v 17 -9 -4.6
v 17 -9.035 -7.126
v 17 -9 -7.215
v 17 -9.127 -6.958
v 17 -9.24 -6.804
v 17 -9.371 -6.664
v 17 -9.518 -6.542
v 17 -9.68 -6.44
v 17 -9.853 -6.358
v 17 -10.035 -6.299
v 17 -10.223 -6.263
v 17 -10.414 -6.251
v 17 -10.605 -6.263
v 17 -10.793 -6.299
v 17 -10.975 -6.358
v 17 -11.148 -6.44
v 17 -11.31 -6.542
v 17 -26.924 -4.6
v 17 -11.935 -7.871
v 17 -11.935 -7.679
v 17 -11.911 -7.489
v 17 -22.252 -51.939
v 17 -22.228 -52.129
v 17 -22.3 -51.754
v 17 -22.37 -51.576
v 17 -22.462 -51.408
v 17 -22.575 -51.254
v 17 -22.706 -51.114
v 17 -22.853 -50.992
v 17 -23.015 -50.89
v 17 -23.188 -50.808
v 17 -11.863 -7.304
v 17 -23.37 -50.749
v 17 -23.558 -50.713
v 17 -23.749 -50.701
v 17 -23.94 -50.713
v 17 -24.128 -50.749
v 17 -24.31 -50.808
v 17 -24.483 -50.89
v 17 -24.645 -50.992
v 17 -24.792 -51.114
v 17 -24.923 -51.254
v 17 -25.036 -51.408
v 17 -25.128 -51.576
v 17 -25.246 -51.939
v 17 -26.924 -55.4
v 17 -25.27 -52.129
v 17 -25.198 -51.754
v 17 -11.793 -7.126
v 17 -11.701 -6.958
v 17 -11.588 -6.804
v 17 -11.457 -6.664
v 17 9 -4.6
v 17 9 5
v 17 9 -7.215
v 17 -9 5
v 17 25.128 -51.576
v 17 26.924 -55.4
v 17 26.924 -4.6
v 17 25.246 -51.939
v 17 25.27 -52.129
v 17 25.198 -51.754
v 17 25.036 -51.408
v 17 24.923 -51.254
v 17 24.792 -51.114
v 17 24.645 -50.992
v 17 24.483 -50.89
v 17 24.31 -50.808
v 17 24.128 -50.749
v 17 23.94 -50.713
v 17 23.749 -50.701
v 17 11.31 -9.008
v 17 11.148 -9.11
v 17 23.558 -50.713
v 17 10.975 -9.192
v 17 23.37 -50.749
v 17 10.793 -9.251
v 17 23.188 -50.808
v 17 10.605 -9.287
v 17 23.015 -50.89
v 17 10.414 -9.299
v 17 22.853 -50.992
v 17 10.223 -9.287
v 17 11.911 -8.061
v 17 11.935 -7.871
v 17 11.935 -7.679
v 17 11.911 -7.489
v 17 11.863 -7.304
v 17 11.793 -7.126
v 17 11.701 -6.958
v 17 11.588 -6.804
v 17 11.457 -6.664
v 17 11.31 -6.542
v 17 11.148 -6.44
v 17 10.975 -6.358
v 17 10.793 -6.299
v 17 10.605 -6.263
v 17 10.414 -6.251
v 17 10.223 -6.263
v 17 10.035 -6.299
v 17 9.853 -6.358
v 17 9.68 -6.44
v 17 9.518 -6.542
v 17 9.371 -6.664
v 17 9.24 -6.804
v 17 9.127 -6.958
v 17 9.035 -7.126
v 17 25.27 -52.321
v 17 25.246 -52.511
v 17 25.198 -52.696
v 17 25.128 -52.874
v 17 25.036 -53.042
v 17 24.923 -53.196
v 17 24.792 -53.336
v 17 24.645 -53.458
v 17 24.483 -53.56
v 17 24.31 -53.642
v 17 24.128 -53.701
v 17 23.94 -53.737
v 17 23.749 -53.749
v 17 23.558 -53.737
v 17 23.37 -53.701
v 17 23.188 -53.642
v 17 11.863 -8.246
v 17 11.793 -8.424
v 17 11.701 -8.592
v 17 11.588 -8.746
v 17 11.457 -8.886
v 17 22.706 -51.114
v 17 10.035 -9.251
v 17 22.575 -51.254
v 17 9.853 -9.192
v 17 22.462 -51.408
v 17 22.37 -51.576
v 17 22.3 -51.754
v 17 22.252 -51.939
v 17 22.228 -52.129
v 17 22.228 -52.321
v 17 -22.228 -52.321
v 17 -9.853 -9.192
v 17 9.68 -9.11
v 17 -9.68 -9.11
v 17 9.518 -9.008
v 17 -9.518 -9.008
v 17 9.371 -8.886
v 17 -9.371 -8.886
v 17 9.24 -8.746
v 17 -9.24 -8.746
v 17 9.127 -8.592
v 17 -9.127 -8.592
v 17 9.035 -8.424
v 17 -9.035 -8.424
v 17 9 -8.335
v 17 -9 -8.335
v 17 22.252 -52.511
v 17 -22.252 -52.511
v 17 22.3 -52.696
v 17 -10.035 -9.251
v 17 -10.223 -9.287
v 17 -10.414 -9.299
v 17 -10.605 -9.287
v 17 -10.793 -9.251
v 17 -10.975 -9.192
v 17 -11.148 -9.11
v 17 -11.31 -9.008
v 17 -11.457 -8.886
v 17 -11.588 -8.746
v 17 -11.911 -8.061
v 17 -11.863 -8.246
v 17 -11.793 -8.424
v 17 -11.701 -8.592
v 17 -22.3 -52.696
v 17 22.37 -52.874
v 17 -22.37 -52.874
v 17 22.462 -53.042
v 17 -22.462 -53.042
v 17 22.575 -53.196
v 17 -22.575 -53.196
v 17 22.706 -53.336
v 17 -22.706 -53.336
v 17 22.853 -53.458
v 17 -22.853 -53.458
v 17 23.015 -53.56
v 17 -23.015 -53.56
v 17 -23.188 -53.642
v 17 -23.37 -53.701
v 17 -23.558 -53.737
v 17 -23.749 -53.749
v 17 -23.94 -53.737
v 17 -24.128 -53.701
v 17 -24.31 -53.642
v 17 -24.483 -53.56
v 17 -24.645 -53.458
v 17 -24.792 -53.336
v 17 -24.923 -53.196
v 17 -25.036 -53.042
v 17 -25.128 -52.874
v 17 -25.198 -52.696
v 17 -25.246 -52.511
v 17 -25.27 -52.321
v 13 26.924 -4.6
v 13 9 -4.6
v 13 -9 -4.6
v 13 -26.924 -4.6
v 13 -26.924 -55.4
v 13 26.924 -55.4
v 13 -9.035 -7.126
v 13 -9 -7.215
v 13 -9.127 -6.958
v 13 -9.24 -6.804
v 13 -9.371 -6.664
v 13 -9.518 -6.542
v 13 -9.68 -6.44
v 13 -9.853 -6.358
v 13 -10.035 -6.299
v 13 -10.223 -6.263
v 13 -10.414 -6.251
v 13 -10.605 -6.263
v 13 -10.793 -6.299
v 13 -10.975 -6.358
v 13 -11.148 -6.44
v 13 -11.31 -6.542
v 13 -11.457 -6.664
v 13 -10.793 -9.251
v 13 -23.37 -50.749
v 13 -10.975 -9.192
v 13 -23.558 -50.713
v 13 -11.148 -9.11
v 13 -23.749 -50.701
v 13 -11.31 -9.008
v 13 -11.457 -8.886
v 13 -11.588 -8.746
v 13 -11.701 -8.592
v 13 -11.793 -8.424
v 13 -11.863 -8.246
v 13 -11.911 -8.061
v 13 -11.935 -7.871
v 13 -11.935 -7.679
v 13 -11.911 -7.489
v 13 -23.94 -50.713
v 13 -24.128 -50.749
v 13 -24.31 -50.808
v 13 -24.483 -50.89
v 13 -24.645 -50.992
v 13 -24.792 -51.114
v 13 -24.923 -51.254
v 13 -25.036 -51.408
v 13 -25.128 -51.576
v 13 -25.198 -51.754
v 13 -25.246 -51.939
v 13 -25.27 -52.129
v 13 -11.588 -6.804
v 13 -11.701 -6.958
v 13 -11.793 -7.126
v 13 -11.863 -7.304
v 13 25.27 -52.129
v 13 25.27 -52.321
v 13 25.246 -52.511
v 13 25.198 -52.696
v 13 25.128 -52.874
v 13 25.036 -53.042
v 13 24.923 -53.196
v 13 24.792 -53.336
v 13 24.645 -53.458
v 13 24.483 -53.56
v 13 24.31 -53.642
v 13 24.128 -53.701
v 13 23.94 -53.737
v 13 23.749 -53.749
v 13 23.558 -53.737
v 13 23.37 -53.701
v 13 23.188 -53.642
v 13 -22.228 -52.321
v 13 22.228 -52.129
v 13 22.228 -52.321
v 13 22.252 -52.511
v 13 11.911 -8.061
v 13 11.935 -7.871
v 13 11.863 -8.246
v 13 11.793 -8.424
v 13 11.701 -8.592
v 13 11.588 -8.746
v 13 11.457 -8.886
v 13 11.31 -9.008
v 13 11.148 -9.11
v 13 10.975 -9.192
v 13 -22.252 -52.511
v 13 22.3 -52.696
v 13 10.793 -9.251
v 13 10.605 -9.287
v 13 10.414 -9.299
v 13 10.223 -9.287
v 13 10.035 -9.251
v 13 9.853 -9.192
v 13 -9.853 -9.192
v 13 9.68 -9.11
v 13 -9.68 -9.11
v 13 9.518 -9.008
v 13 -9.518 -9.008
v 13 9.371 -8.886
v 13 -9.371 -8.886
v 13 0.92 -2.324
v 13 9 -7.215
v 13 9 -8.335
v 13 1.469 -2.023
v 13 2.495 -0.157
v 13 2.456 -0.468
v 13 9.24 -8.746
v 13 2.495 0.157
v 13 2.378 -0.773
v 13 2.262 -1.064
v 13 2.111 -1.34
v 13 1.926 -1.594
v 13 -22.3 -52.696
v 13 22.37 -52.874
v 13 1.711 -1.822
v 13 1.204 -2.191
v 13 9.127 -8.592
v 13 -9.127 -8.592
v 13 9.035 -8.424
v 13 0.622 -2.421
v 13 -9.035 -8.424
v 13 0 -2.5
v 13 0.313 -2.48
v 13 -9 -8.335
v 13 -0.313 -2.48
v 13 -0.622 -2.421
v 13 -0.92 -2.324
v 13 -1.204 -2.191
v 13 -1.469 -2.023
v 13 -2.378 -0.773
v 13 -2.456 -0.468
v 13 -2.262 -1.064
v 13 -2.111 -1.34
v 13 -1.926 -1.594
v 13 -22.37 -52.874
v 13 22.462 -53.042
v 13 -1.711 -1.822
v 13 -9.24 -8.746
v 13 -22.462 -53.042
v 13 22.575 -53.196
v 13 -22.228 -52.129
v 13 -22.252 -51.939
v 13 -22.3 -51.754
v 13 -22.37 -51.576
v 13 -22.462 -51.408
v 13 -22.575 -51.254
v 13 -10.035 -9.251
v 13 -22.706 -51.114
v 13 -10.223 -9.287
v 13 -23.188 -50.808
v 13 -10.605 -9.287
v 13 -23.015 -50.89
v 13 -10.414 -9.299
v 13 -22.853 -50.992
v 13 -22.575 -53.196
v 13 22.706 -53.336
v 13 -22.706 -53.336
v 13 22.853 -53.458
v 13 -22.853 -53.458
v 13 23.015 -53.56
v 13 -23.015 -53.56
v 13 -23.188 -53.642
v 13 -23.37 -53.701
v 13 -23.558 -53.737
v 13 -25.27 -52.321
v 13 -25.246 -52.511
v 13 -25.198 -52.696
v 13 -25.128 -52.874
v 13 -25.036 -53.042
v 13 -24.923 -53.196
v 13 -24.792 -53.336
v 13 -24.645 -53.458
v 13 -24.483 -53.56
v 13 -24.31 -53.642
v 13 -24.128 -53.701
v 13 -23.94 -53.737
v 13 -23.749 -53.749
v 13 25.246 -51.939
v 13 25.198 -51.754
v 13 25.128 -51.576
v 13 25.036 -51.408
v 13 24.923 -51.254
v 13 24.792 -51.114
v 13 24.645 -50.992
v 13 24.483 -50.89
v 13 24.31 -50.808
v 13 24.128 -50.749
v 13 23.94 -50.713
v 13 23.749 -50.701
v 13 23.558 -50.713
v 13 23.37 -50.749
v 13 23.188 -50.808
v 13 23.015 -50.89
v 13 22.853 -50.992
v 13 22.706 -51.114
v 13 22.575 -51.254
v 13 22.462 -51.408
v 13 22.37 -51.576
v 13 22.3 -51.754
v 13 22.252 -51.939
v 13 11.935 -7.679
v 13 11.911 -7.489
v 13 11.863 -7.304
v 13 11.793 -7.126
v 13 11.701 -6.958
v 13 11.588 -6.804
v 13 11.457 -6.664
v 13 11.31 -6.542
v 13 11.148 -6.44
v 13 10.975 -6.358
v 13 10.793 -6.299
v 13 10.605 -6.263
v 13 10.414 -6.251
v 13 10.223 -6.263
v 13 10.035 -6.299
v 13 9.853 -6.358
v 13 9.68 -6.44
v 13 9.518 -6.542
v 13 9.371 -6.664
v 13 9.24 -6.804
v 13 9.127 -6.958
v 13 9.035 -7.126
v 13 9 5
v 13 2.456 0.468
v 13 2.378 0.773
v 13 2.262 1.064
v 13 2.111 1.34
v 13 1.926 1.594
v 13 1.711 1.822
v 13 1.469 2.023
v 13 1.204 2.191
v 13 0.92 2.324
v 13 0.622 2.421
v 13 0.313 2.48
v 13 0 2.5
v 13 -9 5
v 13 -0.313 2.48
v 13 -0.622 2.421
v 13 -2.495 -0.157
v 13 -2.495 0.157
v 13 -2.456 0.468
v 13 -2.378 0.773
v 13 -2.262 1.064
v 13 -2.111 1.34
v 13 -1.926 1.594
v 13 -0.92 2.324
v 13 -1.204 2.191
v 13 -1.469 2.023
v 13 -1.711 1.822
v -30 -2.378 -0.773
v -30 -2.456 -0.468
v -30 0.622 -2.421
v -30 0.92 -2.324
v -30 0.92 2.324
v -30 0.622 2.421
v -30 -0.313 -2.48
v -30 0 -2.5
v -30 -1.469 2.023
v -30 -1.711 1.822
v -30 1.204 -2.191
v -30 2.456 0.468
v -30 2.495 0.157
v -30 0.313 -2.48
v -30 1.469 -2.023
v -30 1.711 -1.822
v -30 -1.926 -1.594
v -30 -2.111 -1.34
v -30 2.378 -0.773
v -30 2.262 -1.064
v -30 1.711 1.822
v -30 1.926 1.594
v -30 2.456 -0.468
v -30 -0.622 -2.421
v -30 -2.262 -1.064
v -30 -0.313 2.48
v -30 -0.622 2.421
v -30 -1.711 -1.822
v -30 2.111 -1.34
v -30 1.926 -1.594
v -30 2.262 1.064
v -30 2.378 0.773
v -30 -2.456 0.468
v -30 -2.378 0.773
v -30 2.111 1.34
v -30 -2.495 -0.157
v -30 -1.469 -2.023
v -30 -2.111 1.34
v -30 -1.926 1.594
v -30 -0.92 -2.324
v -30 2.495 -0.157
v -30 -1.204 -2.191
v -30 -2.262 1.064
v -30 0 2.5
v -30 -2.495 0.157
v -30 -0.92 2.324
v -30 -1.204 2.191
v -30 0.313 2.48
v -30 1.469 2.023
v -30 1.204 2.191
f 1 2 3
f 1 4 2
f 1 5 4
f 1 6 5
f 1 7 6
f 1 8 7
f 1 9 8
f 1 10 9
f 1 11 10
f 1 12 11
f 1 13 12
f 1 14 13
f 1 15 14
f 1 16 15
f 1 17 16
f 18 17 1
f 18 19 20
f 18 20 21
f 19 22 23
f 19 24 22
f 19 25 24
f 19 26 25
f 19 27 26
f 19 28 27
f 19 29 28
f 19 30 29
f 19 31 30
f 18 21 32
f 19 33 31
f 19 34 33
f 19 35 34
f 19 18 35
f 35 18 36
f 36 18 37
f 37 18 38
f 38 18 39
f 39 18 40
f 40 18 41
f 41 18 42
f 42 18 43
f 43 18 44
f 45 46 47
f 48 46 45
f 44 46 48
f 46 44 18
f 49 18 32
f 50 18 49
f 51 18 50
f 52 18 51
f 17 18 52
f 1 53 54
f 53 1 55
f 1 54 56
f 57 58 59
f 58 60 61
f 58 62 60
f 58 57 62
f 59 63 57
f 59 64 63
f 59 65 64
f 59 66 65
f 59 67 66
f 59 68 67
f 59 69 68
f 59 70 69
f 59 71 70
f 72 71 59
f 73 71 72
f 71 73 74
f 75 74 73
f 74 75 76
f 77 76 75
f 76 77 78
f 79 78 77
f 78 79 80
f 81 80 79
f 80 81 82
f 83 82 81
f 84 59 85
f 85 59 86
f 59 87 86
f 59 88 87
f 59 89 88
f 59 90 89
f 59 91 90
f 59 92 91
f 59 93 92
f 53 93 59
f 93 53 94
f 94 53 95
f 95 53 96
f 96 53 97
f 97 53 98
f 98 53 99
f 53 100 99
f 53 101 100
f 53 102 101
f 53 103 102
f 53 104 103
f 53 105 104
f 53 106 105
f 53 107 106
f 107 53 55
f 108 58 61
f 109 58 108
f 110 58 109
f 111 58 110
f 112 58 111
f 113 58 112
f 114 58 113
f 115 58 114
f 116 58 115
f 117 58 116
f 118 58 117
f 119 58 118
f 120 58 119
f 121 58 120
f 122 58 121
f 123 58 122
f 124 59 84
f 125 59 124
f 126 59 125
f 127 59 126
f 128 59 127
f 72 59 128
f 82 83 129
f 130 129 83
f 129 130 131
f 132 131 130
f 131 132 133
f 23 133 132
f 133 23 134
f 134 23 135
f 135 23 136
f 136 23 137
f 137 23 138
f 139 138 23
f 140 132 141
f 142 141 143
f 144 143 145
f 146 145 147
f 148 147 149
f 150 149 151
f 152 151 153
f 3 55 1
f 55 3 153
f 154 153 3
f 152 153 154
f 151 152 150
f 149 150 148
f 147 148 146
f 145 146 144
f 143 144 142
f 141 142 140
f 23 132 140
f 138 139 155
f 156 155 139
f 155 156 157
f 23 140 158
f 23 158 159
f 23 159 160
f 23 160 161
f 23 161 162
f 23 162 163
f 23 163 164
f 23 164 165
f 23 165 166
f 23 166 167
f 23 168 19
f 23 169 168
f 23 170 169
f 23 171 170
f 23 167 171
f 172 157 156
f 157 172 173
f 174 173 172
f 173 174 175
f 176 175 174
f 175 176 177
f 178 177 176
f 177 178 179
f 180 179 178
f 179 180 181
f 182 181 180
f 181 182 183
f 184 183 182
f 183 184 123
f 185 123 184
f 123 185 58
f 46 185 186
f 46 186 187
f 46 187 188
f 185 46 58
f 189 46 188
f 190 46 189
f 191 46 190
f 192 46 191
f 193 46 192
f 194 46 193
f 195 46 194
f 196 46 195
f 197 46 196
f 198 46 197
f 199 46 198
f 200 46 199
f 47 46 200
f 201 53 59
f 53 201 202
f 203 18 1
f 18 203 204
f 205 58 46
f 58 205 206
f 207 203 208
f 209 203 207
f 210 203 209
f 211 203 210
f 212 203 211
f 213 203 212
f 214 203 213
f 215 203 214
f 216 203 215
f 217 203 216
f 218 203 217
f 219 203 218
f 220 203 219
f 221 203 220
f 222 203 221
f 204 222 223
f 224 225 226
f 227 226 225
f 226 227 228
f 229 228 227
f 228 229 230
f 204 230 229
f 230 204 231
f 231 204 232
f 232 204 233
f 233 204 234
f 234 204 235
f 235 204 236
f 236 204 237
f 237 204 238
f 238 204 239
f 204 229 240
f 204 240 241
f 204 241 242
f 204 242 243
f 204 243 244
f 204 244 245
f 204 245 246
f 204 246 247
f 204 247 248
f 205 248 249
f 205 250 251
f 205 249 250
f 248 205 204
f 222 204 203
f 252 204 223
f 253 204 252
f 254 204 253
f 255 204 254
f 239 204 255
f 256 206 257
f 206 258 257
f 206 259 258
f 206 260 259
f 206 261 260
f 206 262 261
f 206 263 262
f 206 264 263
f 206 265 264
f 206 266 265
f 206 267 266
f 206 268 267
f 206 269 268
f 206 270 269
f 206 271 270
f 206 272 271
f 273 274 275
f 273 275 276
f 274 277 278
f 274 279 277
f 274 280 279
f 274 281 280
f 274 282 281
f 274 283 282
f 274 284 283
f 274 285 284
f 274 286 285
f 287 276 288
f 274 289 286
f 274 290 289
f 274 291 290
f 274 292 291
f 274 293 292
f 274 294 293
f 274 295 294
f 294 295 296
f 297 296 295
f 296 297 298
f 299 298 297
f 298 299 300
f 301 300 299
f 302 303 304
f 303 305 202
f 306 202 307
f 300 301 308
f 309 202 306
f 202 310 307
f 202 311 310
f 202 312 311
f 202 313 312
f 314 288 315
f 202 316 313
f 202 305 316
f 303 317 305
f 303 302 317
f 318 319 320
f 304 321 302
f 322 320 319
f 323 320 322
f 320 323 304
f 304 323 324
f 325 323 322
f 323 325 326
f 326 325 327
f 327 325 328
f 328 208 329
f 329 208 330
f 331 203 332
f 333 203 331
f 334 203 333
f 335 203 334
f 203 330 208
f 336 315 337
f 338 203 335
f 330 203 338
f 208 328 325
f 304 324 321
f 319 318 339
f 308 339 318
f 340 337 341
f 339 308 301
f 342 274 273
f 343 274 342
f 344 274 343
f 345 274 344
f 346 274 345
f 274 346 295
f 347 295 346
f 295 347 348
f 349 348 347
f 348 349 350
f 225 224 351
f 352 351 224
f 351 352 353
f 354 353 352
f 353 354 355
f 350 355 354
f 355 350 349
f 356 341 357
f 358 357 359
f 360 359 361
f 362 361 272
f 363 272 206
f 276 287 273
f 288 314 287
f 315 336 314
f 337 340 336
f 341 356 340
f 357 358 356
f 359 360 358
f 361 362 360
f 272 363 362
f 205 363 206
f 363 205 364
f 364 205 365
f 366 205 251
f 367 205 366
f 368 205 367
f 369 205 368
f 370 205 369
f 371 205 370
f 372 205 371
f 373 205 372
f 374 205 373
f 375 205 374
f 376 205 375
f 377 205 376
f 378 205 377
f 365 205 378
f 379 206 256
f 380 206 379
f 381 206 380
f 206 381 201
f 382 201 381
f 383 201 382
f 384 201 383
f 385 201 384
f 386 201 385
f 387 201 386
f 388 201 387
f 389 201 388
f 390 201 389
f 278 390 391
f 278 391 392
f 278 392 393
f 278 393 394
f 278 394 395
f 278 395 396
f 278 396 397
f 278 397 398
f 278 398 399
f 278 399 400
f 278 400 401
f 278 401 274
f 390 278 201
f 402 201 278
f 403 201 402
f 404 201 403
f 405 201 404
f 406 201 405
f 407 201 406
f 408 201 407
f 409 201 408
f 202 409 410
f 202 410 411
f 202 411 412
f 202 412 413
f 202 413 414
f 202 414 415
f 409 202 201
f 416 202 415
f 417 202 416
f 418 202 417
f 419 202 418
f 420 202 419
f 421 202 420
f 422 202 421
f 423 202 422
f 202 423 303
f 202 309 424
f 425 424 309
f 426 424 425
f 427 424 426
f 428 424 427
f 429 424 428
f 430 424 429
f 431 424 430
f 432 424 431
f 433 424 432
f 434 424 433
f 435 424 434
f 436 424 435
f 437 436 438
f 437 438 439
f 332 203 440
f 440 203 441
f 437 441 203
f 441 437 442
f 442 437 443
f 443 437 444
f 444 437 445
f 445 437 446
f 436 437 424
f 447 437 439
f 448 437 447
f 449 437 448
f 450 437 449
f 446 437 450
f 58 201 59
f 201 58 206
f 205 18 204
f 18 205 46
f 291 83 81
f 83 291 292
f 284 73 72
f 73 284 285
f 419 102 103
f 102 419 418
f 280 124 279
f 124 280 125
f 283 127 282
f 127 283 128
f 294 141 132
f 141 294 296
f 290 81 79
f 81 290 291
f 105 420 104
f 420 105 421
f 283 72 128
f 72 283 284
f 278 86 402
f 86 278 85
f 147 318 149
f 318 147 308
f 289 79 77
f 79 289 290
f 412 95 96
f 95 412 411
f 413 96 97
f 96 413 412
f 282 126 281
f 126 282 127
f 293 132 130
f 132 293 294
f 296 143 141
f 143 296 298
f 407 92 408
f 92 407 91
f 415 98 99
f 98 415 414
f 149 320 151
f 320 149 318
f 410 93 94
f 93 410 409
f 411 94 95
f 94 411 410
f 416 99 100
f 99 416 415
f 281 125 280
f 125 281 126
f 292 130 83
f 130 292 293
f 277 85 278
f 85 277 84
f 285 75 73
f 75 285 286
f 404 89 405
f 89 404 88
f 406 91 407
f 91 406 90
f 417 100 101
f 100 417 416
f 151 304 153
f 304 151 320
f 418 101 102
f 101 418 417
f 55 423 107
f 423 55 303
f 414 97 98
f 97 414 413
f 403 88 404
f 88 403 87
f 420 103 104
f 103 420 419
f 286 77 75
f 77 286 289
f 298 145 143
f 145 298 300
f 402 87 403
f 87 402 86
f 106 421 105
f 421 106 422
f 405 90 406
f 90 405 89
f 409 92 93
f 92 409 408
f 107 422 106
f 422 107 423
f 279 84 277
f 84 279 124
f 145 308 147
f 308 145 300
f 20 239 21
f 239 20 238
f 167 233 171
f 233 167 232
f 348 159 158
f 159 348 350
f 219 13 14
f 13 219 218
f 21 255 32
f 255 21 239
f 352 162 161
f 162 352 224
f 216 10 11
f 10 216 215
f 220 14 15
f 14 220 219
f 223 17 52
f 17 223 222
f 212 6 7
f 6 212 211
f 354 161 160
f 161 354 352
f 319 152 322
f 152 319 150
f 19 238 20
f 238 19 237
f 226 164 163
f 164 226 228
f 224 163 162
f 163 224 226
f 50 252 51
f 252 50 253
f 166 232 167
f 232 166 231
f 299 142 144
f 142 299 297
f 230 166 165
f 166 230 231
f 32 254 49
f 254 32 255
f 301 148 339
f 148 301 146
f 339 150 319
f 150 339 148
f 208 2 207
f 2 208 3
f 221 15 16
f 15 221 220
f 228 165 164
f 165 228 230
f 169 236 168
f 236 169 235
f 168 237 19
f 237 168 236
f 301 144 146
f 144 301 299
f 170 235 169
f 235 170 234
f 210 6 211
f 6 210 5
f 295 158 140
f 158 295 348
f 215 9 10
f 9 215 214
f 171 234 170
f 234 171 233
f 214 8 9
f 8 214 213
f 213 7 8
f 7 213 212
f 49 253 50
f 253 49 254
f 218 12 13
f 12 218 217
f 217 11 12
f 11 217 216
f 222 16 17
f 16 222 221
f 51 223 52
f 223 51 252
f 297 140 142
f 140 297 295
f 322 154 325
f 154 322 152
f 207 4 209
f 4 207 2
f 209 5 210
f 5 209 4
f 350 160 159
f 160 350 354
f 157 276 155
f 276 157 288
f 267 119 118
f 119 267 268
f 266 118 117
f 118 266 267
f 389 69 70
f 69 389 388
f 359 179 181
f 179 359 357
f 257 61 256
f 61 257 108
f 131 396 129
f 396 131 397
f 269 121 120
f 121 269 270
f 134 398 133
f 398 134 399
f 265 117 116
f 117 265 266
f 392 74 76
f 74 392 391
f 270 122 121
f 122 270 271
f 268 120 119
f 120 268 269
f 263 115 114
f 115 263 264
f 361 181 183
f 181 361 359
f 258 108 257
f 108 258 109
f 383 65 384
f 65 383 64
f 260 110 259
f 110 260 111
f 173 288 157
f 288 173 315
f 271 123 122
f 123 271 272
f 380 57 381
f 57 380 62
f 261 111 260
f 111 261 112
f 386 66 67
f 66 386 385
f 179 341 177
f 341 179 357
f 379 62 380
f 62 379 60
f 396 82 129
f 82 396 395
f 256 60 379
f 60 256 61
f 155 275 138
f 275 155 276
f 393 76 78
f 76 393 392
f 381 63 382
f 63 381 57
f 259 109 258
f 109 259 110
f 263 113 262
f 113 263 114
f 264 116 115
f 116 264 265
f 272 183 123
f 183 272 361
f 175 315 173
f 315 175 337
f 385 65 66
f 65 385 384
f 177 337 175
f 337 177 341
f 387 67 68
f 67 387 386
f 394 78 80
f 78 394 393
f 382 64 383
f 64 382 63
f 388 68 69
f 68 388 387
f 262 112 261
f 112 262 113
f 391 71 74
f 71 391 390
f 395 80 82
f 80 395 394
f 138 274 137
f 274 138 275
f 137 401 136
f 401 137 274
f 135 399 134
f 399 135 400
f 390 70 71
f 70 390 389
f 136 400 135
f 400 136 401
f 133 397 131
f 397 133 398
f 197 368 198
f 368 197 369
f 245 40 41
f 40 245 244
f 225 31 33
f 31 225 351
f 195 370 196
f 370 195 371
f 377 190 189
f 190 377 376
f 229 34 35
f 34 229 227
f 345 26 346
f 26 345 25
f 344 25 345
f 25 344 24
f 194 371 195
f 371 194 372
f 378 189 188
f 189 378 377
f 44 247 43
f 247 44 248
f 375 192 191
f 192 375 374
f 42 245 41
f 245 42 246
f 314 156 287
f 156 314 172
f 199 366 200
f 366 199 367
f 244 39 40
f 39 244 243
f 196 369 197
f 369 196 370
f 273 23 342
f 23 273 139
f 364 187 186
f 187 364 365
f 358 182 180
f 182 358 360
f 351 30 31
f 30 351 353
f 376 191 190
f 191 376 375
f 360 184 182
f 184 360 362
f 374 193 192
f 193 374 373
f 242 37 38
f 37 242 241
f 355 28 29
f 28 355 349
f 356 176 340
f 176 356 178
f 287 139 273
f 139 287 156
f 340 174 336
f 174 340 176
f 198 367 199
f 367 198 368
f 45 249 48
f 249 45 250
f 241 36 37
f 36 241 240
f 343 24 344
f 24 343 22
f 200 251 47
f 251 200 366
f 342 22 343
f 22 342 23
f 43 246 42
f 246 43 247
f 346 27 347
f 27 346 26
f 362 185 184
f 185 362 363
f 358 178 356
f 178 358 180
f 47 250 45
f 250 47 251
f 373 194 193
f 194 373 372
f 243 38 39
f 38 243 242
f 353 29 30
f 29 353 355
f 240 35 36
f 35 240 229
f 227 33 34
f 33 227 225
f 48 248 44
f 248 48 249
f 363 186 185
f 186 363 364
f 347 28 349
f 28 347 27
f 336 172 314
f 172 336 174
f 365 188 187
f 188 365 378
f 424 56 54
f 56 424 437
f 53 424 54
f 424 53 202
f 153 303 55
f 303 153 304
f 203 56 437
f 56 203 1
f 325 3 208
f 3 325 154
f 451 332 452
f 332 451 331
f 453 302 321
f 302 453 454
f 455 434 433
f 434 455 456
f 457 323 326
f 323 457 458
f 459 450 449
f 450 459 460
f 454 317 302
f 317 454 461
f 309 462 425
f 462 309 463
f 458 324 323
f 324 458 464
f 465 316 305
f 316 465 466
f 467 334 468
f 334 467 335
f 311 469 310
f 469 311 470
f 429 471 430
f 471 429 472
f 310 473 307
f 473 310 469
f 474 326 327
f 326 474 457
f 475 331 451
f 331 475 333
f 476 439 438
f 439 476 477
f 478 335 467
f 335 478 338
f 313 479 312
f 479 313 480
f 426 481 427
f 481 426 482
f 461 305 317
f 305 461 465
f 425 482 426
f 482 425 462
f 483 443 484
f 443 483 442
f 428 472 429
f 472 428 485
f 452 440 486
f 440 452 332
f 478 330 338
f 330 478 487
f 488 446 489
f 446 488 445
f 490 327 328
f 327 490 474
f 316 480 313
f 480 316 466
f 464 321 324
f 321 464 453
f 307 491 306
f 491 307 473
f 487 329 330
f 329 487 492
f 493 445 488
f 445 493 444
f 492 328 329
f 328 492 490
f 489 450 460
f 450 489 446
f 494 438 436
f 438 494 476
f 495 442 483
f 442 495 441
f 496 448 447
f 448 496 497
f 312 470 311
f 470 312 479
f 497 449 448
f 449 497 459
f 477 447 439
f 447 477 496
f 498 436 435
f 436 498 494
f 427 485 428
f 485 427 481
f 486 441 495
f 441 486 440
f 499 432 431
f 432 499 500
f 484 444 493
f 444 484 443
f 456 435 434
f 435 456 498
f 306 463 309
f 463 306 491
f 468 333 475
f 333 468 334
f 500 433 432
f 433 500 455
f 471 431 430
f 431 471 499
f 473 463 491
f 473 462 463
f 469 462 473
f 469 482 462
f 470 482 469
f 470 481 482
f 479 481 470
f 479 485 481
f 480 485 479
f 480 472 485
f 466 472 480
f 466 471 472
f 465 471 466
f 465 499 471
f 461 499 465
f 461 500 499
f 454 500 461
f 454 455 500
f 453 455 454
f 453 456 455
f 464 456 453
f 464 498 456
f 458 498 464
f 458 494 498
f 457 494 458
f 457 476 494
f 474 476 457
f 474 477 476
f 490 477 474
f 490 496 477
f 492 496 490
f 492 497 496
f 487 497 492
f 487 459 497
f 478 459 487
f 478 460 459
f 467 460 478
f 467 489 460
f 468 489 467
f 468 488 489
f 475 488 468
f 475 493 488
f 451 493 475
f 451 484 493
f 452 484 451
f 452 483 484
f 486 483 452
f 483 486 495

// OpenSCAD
//Camera Attachment
CAdiameter = 5.0;
CAradius = CAdiameter/2;
CAlength = 30.0;

//Camera Board
CamDistance1 = 3.175;
CamDistance2 = 3.81;
CamDistance3 = 12.7;
CamDistance4 = 10.414;
CamHeight = 50.8; //z
CamHeight2 = 44.45;
CamLength = 53.848; //y
CamWidth = 4.0; //x
CamHoleDiameter = 3.048;
CamHoleRadius = CamHoleDiameter/2;

module cube_true(x, y, z){
    cube(size = [x, y, z], center = true);
}

module cylinder_base(x,y){
    cylinder(h=x,r=y,center=true,$fn=50);
}

module cylinder_base2(){
    rotate([0,90,0])
    cylinder(h=CamWidth,r=CamHoleRadius,center=true,$fn=50);
}

module camera_board(){
    translate([CAlength/2,0,0])
    difference(){
        cube_true(CamWidth,CamLength,CamHeight);
        //hole:top left
        translate([0,CamDistance4,CamHeight/2-CamDistance1]) cylinder_base2();
        //hole:top right
        mirror([0,1,0]) translate([0,CamDistance4,CamHeight/2-CamDistance1]) cylinder_base2();
        //hole: bottom left
        translate([0,CamLength/2-CamDistance1,-CamHeight/2+CamDistance1]) cylinder_base2();
        //hole: bottom right
        mirror([0,1,0]) translate([0,CamLength/2-CamDistance1,-CamHeight/2+CamDistance1]) cylinder_base2();
    }
}

//depending on where we wanna put the camera, board CBheight can be changed. 
CBdistance = CAdiameter;
CBlength = 18.0; //y
CBwidth = CamWidth; //x
CBheight = 30.0; //z

//cylinder extension
CElength = 30.0;
CEradius = CAradius;



union(){
    //board!!
    translate([CAlength/2,0,CBdistance - CBheight/2]) cube_true(CBwidth,CBlength,CBheight);
    //camera board
    translate([0,0,-CBheight]) camera_board();
    rotate([0,90,0]) cylinder_base(CAlength, CAradius);
    //longer cylinder?? depending on where you wanna put the camera
    translate([-CAlength/2,0,0]) rotate([0,90,0]) cylinder_base(CElength,CEradius);
}
